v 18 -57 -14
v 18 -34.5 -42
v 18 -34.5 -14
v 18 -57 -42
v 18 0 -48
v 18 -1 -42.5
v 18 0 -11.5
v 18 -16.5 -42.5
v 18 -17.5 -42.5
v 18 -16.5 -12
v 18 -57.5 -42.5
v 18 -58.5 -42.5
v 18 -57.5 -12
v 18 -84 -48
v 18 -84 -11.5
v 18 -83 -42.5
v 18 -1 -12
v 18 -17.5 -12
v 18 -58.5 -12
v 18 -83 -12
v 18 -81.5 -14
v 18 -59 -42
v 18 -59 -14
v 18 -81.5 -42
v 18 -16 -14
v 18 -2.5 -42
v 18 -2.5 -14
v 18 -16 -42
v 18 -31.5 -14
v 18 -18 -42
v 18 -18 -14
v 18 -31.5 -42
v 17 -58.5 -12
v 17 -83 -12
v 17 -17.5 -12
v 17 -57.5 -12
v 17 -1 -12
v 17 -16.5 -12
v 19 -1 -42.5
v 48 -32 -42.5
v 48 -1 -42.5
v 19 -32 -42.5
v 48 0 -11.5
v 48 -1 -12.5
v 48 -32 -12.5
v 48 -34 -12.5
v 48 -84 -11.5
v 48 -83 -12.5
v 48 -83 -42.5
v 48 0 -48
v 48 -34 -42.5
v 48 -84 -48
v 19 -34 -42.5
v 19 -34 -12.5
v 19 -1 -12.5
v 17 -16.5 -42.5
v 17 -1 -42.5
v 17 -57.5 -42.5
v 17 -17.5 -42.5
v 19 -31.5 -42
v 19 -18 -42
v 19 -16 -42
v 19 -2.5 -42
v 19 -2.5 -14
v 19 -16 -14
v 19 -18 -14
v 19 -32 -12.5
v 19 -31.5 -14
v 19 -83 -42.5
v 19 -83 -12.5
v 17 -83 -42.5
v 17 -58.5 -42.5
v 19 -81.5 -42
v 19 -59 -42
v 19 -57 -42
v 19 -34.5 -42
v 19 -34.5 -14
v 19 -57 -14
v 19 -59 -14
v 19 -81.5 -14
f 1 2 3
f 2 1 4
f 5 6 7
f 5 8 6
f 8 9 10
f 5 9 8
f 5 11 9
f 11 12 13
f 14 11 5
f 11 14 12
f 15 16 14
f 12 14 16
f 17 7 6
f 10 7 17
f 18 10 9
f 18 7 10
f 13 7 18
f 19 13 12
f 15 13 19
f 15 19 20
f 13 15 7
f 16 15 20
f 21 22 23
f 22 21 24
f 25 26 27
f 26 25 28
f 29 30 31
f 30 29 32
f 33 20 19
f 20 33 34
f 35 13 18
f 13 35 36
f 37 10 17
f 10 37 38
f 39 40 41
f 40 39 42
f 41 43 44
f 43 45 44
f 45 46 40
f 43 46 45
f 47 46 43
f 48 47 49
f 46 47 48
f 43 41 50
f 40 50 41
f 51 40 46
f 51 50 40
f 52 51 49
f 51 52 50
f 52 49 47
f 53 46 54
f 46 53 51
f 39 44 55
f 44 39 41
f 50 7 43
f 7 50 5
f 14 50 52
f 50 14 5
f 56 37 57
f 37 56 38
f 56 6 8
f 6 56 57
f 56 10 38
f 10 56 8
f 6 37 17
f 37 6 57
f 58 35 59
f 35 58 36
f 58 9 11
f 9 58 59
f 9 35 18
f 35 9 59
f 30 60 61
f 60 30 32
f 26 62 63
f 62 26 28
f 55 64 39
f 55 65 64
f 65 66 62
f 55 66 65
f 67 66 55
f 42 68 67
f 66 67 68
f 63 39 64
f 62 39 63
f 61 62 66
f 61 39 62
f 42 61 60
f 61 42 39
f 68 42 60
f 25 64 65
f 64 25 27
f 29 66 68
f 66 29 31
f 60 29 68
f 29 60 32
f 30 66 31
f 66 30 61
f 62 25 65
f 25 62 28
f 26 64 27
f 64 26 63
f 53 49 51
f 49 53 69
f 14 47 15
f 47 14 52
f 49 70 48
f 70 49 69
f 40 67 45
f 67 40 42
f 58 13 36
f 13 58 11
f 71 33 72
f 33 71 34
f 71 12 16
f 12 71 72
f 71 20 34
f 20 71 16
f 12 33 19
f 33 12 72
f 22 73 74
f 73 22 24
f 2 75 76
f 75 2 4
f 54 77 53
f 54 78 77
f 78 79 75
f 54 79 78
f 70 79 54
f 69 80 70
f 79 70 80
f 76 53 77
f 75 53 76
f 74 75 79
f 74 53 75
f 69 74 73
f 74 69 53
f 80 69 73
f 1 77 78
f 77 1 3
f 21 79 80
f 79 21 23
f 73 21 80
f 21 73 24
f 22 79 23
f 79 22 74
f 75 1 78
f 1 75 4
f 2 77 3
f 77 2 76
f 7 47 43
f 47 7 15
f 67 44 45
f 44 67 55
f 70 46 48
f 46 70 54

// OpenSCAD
// file: Gilgahedron.scad
//Copyright 2022-2023 Gilgamech Technologies
//Title: Gilgahedron.scad v1.5
//Made by: Stephen Gillie
//Created on: 3/17/2022
//Updated on: 3/29/2023
//Units: any
//Notes: 
//v1.4 all shapes checked for inversions with f12, normalized to units of 1, and support full Gilgahedron notation (dimensions of size/scale, translation, rotation)
//1.5: Added gOval.

//icon_extrude("BigG.dxf",1,1,5);
//inverse_icon_extrude("BigG.dxf",1,1,5);

//Basic Shapes
module gCube(xSize=1,ySize=1,zSize=1,xMove=0,yMove=0,zMove=0,xRotate=0,yRotate=0,zRotate=0){
translate([xMove,yMove,zMove])
rotate([xRotate,yRotate,zRotate])
    cube([xSize,ySize,zSize],center=true);
}

module gCylinder(h=1,r1=1,r2=1,xMove=0,yMove=0,zMove=0,xRotate=0,yRotate=0,zRotate=0){
translate([xMove,yMove,zMove])
rotate([xRotate,yRotate,zRotate])
    cylinder(h,r1,r2,center=true,$fn=100);
}

module gSphere(xScale=1,yScale=1,zScale=1,xMove=0,yMove=0,zMove=0,xRotate=0,yRotate=0,zRotate=0){
translate([xMove,yMove,zMove])
rotate([xRotate,yRotate,zRotate])
    scale([xScale,yScale,zScale]) 
    sphere(r=(1),$fn=100);
}

module gOval(h=100,x=40,y=60) {
    scale([1,(y/x),1])
    gCylinder(100,40,40);
}

//Complex polyhedra
module pyramid(xScale=1,yScale=1,zScale=1,xMove=0,yMove=0,zMove=0,xRotate=0,yRotate=0,zRotate=0){

Points = [
  [ 0,  0,  0 ],  //0
  [ 8,  0,  0 ],  //1
  [ 8,  8,  0 ],  //2
  [ 0,  8,  0 ],  //3
  [ 4,  4,  8 ]];  //4

Faces = [
  [0,1,2,3],  // bottom
  [4,1,0],  // front
  [4,2,1],  // right
  [4,3,2],  // back
  [4,0,3]]; // left
  
translate([xMove,yMove,zMove])
rotate([xRotate,yRotate,zRotate])
    scale([xScale,yScale,zScale]) 
polyhedron( Points, Faces );
}
module d4(xScale=1,yScale=1,zScale=1,xMove=0,yMove=0,zMove=0,xRotate=0,yRotate=0,zRotate=0){

Points = [
  [ 0,  0,  0 ],  //0
  [ 1,  .25,  0 ],  //1
  [ .25,  1,  0 ],  //2
  [ .375,  .375,  .875]];  //3

Faces = [
  [0,1,2],  // bottom
  [1,0,3],  // right
  [0,2,3],  // left
  [1,3,2]]; // back
  
translate([xMove,yMove,zMove])
rotate([xRotate,yRotate,zRotate])
    scale([xScale,yScale,zScale]) 
polyhedron( Points, Faces );
}
module d8(xScale=1,yScale=1,zScale=1,xMove=0,yMove=0,zMove=0,xRotate=0,yRotate=0,zRotate=0){

Points = [
  [ 4, 4, 0 ],  //0
  [ 8, 0, 6 ],  //1
  [ 8, 8, 6 ],  //2
  [ 0, 8, 6 ],  //3
  [ 0, 0, 6 ],  //4
  [ 4, 4,12 ]];  //0

Faces = [
  [0,1,2], // bottom front
  [0,2,3], // bottom right
  [0,3,4], // bottom back
  [0,4,1], // bottom left
  [1,5,2], // top front
  [2,5,3], // top right
  [3,5,4], // top back
  [4,5,1]]; // top left
  
translate([xMove,yMove,zMove])
rotate([xRotate,yRotate,zRotate])
    scale([xScale,yScale,zScale]) 
polyhedron( Points, Faces );
}
module silo(xScale=1,yScale=1,zScale=1,xMove=0,yMove=0,zMove=0,xRotate=0,yRotate=0,zRotate=0){

height=.7075;
diameter=height*0.4125;

translate([xMove,yMove,zMove+(height/2)])
rotate([xRotate,yRotate,zRotate])
    scale([xScale,yScale,zScale]) {
gCylinder(height,diameter,diameter);
gSphere(diameter,diameter,diameter,0,0,height/2);
}}

//Extrusion
module file_extrude(filename="bigG.dxf"){
translate([-20,-20,0])
linear_extrude(height = 1, center = true)
import (file = filename);
}
module icon_extrude(filename="bigG.dxf",xScale=1,yScale=1,zScale=1,xMove=0,yMove=0,zMove=0,xRotate=0,yRotate=0,zRotate=0){
translate([xMove,yMove,zMove])
rotate([xRotate,yRotate,zRotate])
scale([xScale,yScale,zScale])
file_extrude(filename);

}
module inverse_icon_extrude(filename="bigG.dxf",xScale=1,yScale=1,zScale=1,xMove=0,yMove=0,zMove=0,xRotate=0,yRotate=0,zRotate=0){
bezelMult = 45;
difference(){
gCube(xScale*bezelMult,yScale*bezelMult,zScale,xMove,yMove+.5,zMove,xRotate,yRotate,zRotate);
icon_extrude(filename,xScale,yScale,zScale*1.05,xMove,yMove,zMove,xRotate,yRotate,zRotate);
}}

module text_extrude(string="Hello World!",height=1){
translate([-36,-4.5,0])
linear_extrude(height)
    text(string);
}
module gText(text="Hello World!",xSize=1,ySize=1,zSize=1,xTrans=0,yTrans=0,zTrans=0,xRot=0,yRot=0,zRot=0){
    translate([xTrans,yTrans,zTrans])
    rotate([xRot,yRot,zRot])
    scale([xSize*.1,ySize*.1,zSize*.1])
    linear_extrude(1)
    text(text);
}

//utility
module roundedBox(xSize=36,ySize=36,zSize=2,xTrans=0,yTrans=0,zTrans=0,xRot=0,yRot=0,zRot=0){
translate([xTrans,yTrans,zTrans])
rotate([xRot,yRot,zRot])
union(){
cubeSF=1.25;
gCube(xSize/cubeSF,ySize,zSize);
gCube(xSize,ySize/cubeSF-1,zSize);

cylSF=cubeSF*2;
cr=xSize*.085;

//dishwasher
//cx=xSize/cylSF+.4;
//cy=ySize/cylSF-1.2;

//bathtub
cx=xSize/cylSF+.8; 
cy=ySize/cylSF-1.6;


gCylinder(zSize,cr,cr,cx,cy);
gCylinder(zSize,cr,cr,-cx,cy);
gCylinder(zSize,cr,cr,cx,-cy);
gCylinder(zSize,cr,cr,-cx,-cy);
}}
module gBowl(length=4,width=4,depth=4,xTrans=0,yTrans=0,zTrans=0,xRot=0,yRot=0,zRot=0){
translate([xTrans,yTrans,zTrans])
    rotate([xRot,yRot,zRot])
difference(){
    gSphere(length,width,depth);
    gSphere(length,width,depth*1.125,0,0,depth*.125);
}}
//bar stock
module gTube(length=1,r1=1,r2=1,xTrans=0,yTrans=0,zTrans=0,xRot=0,yRot=0,zRot=0){
difference(){
    gCylinder(length,r1,r2,xTrans,yTrans,zTrans,xRot,yRot,zRot);
    gCylinder(length*1.1,r1*.9,r2*.9,xTrans,yTrans,zTrans,xRot,yRot,zRot);
}}
module roundedEdge(xSize = 1,ySize = 2,zSize = 10,xTrans=0,yTrans=0,zTrans=0,xRot=0,yRot=0,zRot=0) {
intersection() {
    gCylinder(zSize,ySize/2,ySize/2,xTrans,yTrans,zTrans,xRot,yRot,zRot);
    gCube(xSize,ySize,zSize,xTrans,yTrans,zTrans,xRot,yRot,zRot);
}}
//library
module checkPrint(Size=109){gCube(Size,Size,Size);}
// main file
//Copyright 2022 Gilgamech Technologies
//Title: Square room with door
//Made by: Stephen Gillie
//Created on: 3/16/2022
//Updated on: 3/25/2022
//Units: inches (0.0254)
//Notes: Designed as 20 x 20 x 6 ft, but should be fully adjustable.
include  <Gilgahedron.scad>

xDim = 8*12;//96
yDim = 14*12;//168
zDim = 8*12;//96

//room(xDim,yDim,zDim);
//sinkDWCabinet();
longCabinet();


xCabSize=30;
yCabSize=52;
zCabSize=36;

xCabLoc = -xDim/2+xCabSize/2;//-63
yCabLoc = -yDim/2+yCabSize/2;//-124
zCabLoc = -zDim/2+zCabSize;//-12

module sinkDWCabinet(){
yDwAdj=28;
gCube(xCabSize,yCabSize+yDwAdj,1,xCabLoc,yCabLoc+yDwAdj/2,zCabLoc);//countertop
cabinet(xCabSize,yCabSize,zCabSize,
    xCabLoc,yCabLoc+yDwAdj,zCabLoc,.5-yDwAdj*2);//needs sink
}

module longCabinet(){
yCabLoc2=yCabSize;
rotate([0,0,180]){
gCube(xCabSize,yDim/2,1,xCabLoc,yDim/4,zCabLoc);//countertop
cabinet(xCabSize,34,zCabSize,
    xCabLoc,17,zCabLoc);//mid
cabinet(xCabSize,yCabSize,zCabSize,
    xCabLoc,-yCabLoc,zCabLoc);//right
}}

//object(8*12,14*12,8*12);

module object(xSize=0,ySize=240,zSize=96,doorGap=-5,zRotate=0){
difference(){
    justSide(0,xSize,zSize,90);//front
    gCube(ySize/2,zSize,zSize/1.2,0,0,doorGap);
}}//right


module justSide(xLoc,ySize,zSize,zRotate){
rotate([0,0,zRotate])
gCube(.1,ySize,zSize,xLoc/2,0,0);
}
module room(xSize=240,ySize=240,zSize=96,doorGap=-5,zRotate=0){
difference(){
    justSide(xSize,ySize,zSize,zRotate);
    gCube(zSize/2,zSize/2,zSize/1.2,xSize/2,zSize/4,doorGap);
}//right
difference(){
    justSide(-xSize,ySize,zSize,zRotate);
    gCube(zSize/2,zSize/2,zSize/1.2,-xSize/2,zSize/4,doorGap);
}//left
justSide(ySize,xSize,zSize,90);//front
difference(){
    justSide(ySize,xSize,zSize,270);
    gCube(ySize/2,zSize,zSize/1.2,0,-ySize/2,doorGap);
}//rear

//gCube(xSize,ySize,.1,0,0,zSize/2);//ceiling
gCube(xSize,ySize,.1,0,0,-zSize/2);//floor
}

module cabinet(xSize=24,ySize=96,zSize=30,xLoc=0,yLoc=0,zLoc=30){

zToeKick=5.5;

gCube(xSize,1,zSize-zToeKick,xLoc,yLoc+ySize/2-.5,zLoc-zSize/2+zToeKick/2);//right side
gCube(xSize,1,zSize-zToeKick,xLoc,yLoc-ySize/2+.5,zLoc-zSize/2+zToeKick/2);//left side
gCube(xSize,ySize,zToeKick,
    xLoc,yLoc,zLoc-zSize+zToeKick/2);//toeKick


xCabFront=-xCabSize/2-3.5;//-15
yCabFront=yLoc;
zCabFront=zCabLoc-15;//69
yDoorSize=ySize/2-1.5;
yDoorAdjust=yDoorSize/2+.5;

gCube(1,yDoorSize,zSize-zToeKick,
    xCabFront+1,yCabFront-yDoorAdjust,zLoc-zSize/2+zToeKick/2);//door
gCube(1,yDoorSize,zSize-zToeKick,
    xCabFront+1,yCabFront+yDoorAdjust,zLoc-zSize/2+zToeKick/2);//other door

gCube(1,yDoorSize*2+1,2,
    xCabFront,yCabFront,zCabFront-zSize/2+2);//front top
gCube(1,yDoorSize*2+1,2,
    xCabFront,yCabFront,zCabFront+zSize/2-4);//front bot

gCube(1,2,zSize-zToeKick,
    xCabFront,yCabFront+yDoorSize,zLoc-zSize/2+zToeKick/2);//front left
gCube(1,2,zSize-zToeKick,
    xCabFront,yCabFront,zLoc-zSize/2+zToeKick/2);//front mid
gCube(1,2,zSize-zToeKick,
    xCabFront,yCabFront-yDoorSize,zLoc-zSize/2+zToeKick/2);//front right

}
